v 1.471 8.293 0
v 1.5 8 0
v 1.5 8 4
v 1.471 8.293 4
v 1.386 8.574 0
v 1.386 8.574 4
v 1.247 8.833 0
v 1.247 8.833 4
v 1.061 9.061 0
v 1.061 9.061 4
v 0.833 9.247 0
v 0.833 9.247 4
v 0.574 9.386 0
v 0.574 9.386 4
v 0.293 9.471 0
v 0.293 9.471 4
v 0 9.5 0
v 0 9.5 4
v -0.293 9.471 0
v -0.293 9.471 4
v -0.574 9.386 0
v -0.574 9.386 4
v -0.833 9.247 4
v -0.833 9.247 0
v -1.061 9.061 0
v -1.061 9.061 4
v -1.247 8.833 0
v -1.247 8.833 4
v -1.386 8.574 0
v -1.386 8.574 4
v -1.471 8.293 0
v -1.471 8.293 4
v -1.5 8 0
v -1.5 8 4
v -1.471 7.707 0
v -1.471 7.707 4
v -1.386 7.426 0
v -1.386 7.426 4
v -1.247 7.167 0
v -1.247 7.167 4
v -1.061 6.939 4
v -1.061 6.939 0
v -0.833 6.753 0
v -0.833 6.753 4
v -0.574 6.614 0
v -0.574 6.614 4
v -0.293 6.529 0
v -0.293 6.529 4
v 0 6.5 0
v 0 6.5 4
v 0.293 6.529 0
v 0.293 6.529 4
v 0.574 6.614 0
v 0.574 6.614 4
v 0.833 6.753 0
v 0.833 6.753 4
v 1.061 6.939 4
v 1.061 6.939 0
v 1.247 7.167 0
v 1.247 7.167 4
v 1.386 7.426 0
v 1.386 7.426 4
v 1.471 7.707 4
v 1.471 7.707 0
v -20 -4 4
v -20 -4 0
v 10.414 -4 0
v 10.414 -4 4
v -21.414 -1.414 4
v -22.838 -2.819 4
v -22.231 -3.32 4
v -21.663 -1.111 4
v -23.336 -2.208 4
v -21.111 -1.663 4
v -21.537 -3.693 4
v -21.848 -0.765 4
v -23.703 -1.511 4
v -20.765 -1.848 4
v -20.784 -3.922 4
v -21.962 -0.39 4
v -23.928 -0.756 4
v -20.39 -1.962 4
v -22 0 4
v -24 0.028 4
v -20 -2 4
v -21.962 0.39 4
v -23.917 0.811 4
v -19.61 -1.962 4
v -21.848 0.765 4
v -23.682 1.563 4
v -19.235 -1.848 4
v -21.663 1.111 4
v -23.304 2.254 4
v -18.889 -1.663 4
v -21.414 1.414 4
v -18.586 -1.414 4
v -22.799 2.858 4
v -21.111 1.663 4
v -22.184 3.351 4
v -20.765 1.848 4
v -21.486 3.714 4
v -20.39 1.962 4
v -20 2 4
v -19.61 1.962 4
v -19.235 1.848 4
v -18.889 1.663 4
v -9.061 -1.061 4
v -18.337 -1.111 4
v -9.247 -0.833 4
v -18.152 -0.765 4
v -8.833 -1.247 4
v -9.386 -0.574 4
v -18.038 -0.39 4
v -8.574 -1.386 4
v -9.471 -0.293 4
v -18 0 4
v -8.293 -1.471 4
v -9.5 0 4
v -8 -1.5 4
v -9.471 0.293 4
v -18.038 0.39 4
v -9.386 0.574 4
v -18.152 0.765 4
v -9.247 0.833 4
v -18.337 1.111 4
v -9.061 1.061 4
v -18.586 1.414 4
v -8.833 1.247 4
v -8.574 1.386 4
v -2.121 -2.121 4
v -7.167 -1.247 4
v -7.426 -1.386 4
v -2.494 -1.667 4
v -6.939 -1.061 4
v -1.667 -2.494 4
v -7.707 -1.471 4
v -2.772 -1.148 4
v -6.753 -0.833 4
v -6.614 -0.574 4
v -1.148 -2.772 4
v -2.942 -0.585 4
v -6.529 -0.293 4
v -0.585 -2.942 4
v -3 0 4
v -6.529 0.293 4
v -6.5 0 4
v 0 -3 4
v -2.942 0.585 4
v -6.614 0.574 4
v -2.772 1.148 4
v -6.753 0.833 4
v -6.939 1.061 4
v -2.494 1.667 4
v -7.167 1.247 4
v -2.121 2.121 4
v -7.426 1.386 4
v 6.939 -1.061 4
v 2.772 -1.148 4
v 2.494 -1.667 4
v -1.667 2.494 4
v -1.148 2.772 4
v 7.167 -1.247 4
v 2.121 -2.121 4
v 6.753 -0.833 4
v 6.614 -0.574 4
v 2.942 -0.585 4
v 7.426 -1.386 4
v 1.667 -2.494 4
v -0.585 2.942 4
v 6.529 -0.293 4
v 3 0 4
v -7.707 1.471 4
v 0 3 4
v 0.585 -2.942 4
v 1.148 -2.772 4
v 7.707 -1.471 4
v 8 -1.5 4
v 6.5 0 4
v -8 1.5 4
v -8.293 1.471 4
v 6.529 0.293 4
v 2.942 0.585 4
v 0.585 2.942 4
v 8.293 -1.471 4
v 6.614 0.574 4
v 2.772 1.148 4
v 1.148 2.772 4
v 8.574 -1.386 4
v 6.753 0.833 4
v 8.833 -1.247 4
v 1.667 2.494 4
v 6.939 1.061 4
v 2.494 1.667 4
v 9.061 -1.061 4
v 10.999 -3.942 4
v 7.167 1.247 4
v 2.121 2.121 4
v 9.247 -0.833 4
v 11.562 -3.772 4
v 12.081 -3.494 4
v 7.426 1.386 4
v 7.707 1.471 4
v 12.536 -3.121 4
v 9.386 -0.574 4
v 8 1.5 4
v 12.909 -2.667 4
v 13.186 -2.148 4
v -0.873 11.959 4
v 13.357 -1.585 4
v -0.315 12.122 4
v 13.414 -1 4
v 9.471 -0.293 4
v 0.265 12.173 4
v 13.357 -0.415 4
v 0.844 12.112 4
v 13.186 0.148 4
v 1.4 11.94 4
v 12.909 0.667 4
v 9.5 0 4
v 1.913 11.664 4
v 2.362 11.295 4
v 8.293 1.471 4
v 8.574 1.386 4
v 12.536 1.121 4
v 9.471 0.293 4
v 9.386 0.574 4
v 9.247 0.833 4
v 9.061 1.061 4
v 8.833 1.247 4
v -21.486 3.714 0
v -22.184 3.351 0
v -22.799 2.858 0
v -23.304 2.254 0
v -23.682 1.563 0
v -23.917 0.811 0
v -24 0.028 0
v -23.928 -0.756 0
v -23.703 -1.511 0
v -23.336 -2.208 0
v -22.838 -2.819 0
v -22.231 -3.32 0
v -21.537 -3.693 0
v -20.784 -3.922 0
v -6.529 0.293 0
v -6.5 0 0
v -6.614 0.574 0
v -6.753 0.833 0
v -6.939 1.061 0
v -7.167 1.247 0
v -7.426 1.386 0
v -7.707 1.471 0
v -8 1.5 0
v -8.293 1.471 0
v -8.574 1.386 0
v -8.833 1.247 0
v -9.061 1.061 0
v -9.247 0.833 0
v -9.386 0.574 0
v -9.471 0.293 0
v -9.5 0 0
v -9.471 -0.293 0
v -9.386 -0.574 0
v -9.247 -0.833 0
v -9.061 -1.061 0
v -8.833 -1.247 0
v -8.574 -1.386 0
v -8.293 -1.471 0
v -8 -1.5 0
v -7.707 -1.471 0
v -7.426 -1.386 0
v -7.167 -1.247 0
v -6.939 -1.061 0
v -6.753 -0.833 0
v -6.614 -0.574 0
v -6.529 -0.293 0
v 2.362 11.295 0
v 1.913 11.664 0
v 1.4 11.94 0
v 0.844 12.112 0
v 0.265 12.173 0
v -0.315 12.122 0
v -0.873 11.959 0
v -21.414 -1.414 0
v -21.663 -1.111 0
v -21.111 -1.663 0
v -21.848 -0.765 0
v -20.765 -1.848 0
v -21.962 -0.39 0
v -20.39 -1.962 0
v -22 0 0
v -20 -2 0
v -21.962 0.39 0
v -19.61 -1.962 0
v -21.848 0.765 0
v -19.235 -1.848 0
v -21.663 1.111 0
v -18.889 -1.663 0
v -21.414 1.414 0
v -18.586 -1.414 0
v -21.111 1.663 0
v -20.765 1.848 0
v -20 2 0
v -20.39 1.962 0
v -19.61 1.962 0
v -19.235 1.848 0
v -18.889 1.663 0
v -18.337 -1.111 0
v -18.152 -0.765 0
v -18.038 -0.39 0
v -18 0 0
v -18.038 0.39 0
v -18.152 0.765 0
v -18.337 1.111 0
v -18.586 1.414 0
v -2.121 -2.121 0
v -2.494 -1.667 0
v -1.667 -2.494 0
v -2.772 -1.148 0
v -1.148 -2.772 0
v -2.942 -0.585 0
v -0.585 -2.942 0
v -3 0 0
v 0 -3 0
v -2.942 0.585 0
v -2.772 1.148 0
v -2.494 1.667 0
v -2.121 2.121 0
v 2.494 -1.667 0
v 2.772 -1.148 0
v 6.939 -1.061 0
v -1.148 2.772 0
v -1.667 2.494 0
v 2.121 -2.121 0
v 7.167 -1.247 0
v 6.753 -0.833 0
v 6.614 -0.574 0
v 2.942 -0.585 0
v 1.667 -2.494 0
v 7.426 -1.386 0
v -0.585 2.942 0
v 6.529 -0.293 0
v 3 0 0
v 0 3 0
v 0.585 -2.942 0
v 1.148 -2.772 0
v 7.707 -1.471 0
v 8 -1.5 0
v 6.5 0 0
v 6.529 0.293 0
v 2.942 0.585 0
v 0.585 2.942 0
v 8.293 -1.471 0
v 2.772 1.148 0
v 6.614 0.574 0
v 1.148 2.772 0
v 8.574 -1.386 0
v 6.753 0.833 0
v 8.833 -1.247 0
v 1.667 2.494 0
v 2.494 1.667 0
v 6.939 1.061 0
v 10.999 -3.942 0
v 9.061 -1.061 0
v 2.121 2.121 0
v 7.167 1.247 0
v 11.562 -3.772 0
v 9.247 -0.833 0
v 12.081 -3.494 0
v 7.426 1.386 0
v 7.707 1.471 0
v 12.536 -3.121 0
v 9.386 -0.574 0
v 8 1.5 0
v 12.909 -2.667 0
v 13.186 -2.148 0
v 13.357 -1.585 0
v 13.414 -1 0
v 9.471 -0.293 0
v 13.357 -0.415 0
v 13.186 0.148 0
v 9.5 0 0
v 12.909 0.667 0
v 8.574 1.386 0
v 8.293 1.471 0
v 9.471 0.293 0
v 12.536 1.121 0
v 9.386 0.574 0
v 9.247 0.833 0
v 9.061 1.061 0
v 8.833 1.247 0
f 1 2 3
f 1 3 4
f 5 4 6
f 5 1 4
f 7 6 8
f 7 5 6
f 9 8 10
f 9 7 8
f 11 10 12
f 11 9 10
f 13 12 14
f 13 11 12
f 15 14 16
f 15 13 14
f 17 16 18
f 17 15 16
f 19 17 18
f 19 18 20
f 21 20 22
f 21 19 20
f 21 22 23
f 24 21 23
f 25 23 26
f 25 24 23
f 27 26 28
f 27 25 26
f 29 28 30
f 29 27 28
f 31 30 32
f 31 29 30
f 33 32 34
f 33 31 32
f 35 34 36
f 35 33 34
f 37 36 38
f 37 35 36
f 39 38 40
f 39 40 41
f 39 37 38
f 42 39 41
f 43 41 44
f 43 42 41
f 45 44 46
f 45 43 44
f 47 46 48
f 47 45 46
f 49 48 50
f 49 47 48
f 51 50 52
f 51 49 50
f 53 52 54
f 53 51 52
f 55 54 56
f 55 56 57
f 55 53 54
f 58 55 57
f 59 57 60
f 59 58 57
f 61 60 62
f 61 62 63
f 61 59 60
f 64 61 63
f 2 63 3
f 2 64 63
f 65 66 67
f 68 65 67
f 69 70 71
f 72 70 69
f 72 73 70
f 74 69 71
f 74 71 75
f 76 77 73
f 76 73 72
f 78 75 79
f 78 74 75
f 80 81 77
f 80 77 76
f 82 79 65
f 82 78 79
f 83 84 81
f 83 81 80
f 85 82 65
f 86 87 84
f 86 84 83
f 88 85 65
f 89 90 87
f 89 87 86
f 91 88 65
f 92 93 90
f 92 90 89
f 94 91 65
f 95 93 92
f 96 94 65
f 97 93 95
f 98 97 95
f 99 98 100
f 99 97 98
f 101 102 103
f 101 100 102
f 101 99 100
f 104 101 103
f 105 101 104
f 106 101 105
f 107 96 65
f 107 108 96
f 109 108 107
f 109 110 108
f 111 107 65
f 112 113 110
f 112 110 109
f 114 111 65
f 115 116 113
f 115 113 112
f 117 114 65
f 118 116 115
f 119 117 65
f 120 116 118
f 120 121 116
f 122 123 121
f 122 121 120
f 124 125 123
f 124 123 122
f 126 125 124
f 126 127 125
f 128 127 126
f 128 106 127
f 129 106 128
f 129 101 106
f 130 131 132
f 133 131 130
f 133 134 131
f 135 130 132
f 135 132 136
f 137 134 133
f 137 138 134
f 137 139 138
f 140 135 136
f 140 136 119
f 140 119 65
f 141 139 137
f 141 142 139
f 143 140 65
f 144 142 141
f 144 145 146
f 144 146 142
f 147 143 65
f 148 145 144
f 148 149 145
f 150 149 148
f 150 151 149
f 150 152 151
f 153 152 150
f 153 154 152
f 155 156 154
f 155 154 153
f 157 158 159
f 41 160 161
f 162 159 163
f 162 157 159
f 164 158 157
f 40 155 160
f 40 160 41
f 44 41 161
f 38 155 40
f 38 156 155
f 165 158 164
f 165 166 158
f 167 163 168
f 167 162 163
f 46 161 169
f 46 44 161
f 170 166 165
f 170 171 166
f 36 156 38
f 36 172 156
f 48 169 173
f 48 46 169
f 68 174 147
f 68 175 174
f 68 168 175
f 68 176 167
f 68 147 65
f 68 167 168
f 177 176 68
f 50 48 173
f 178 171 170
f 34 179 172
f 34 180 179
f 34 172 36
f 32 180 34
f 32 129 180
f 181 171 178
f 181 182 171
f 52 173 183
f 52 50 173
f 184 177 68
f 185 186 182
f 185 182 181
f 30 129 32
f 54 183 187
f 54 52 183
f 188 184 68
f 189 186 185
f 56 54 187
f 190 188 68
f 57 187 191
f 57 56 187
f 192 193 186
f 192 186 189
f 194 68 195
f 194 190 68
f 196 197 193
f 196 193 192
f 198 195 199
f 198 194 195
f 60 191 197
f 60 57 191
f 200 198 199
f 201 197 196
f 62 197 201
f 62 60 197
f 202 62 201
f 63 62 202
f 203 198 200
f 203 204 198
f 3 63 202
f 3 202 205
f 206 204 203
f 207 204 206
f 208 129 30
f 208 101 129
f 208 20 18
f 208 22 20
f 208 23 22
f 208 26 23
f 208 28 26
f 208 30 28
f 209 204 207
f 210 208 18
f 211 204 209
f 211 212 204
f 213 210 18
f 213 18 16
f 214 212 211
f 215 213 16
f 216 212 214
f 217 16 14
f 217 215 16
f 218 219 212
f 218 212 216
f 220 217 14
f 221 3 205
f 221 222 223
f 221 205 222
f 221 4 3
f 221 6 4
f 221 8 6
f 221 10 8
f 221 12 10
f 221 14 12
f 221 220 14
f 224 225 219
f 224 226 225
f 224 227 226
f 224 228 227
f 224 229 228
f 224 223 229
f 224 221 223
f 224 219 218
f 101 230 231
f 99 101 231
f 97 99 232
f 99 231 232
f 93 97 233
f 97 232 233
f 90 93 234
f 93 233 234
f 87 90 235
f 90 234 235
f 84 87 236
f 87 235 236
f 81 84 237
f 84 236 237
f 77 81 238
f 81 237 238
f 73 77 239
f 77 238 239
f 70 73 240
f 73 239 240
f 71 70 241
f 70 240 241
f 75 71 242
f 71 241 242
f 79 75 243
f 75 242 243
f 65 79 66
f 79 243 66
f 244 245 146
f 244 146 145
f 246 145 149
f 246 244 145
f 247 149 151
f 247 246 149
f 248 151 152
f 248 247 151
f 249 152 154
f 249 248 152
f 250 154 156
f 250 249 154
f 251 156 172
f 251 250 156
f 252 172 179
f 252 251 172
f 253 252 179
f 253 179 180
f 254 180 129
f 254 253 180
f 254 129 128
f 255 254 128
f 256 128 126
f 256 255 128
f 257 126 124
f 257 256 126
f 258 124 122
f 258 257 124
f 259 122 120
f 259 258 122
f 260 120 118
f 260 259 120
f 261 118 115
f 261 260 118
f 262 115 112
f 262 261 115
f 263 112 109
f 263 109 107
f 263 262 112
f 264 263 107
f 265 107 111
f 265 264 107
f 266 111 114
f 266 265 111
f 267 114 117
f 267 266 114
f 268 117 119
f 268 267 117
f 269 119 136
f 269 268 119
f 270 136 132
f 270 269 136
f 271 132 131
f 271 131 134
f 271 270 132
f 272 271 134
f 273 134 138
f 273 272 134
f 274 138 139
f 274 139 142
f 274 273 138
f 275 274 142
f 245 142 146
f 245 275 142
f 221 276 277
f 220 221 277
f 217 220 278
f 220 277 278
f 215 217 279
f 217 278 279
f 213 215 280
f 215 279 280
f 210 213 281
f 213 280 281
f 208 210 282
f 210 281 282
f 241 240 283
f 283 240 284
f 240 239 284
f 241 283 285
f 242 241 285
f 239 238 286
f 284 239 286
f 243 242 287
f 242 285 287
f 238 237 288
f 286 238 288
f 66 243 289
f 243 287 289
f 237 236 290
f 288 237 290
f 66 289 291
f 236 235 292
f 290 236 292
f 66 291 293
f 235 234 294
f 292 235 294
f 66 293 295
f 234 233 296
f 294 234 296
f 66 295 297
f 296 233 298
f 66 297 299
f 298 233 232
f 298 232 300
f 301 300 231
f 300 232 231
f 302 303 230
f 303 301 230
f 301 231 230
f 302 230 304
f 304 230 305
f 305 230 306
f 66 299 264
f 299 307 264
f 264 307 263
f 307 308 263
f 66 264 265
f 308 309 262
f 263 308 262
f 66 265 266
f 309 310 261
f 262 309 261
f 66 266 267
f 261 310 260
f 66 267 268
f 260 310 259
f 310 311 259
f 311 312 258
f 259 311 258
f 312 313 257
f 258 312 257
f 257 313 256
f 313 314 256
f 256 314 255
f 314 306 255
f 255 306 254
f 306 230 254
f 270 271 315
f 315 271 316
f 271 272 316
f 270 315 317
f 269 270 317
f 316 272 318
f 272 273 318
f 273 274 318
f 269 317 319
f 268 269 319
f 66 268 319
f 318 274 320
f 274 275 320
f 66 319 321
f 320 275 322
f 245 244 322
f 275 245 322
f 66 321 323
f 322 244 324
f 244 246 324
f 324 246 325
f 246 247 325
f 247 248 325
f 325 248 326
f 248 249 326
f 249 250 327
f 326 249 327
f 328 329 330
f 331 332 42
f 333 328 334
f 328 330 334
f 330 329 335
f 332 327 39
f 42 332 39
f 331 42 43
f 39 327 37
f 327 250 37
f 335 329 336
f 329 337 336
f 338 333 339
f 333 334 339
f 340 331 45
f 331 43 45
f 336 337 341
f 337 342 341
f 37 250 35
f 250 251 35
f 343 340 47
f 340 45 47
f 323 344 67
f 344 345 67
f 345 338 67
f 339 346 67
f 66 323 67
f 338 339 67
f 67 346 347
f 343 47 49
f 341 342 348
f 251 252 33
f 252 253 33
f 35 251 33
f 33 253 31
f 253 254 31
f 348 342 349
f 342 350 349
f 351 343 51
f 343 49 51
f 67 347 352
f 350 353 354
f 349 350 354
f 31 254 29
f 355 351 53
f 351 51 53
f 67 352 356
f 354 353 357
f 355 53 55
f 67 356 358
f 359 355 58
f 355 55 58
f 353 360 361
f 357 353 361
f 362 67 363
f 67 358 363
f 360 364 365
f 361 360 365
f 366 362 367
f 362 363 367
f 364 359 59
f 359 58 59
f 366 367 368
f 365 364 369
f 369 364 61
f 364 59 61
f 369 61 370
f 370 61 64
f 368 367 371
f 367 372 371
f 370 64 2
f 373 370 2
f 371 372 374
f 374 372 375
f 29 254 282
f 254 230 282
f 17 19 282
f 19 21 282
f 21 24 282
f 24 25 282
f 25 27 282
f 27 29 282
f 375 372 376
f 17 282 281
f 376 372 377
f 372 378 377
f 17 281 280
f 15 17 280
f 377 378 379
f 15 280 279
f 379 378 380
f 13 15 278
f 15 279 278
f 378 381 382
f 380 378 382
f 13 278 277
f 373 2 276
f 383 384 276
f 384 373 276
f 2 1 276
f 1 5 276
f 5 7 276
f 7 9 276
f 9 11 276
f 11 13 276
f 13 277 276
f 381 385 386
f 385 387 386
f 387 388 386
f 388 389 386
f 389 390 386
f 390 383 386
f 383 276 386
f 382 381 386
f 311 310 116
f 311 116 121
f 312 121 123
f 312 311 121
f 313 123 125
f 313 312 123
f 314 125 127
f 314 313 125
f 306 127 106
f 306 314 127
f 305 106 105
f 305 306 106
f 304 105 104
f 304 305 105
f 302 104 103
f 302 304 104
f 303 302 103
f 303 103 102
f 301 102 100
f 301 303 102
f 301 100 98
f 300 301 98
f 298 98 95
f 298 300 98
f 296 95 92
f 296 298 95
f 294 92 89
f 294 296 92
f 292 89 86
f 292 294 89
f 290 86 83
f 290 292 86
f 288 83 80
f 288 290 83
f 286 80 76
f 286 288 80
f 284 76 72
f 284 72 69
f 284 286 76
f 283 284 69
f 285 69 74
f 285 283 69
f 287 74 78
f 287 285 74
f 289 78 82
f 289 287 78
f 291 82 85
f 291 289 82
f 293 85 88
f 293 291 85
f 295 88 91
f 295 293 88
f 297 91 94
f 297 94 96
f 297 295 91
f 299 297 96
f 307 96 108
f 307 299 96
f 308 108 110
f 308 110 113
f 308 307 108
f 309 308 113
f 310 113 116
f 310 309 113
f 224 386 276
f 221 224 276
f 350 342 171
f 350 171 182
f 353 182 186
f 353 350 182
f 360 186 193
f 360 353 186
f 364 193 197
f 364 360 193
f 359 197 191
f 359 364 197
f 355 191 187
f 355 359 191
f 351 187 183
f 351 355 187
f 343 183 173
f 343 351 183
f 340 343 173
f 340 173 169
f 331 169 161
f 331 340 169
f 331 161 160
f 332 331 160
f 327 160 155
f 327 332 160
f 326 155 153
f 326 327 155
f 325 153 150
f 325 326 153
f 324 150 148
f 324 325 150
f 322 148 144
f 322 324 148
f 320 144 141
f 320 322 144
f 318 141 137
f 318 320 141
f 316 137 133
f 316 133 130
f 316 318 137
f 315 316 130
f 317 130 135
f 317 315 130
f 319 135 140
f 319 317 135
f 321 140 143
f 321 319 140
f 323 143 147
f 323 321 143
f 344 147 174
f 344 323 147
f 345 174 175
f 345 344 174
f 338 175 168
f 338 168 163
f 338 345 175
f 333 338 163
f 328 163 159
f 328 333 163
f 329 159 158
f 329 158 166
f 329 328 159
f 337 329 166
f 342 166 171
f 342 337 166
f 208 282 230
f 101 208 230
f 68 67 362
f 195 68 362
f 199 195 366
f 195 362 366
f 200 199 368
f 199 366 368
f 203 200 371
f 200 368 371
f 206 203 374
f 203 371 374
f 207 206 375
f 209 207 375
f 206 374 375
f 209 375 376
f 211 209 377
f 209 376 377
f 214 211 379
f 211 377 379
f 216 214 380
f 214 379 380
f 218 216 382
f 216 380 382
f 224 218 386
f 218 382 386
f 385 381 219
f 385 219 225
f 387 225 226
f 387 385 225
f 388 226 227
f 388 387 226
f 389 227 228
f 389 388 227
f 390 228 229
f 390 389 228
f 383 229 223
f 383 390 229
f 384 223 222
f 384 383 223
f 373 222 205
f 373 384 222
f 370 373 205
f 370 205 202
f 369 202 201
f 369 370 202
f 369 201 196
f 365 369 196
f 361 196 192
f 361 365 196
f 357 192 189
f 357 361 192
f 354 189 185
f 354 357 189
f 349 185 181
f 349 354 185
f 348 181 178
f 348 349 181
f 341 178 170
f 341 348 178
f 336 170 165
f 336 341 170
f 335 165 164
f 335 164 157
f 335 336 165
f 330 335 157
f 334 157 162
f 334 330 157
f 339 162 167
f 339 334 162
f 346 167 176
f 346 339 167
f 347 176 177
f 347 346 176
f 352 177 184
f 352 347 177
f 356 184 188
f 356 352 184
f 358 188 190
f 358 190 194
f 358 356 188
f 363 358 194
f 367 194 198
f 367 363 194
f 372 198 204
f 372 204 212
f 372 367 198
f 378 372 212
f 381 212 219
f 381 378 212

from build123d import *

# Parameters (mm, degrees)
SKETCH_1_R      = 1.5
SKETCH_1_R_2    = 2
SKETCH_1_R_3    = 3
EXTRUDE_1_DEPTH = 4


with BuildPart() as part:
    # 草图1 → 凸台-拉伸1 (new body)
    with BuildSketch(Plane.XY):
        with BuildLine():
            Line((-0.873328743, 11.958800349), (-21.485562705, 3.713906764))
            ThreePointArc((-21.485562705, 3.713906764), (-23.927825547, -0.756430085), (-20, -4))
            Line((-20, -4), (10.414213562, -4))
            ThreePointArc((10.414213562, -4), (13.18585216, -2.148050297), (12.535533906, 1.121320344))
            Line((12.535533906, 1.121320344), (2.36216363, 11.29469062))
            ThreePointArc((2.36216363, 11.29469062), (0.844040903, 12.112103444), (-0.873328743, 11.958800349))
        make_face()
        with Locations((0, 8)):
            Circle(SKETCH_1_R, mode=Mode.SUBTRACT)
        with Locations((8, 0)):
            Circle(SKETCH_1_R, mode=Mode.SUBTRACT)
        with Locations((-20, 0)):
            Circle(SKETCH_1_R_2, mode=Mode.SUBTRACT)
        Circle(SKETCH_1_R_3, mode=Mode.SUBTRACT)
        with Locations((-8, 0)):
            Circle(SKETCH_1_R, mode=Mode.SUBTRACT)
    extrude(amount=EXTRUDE_1_DEPTH)


solid = part.part
